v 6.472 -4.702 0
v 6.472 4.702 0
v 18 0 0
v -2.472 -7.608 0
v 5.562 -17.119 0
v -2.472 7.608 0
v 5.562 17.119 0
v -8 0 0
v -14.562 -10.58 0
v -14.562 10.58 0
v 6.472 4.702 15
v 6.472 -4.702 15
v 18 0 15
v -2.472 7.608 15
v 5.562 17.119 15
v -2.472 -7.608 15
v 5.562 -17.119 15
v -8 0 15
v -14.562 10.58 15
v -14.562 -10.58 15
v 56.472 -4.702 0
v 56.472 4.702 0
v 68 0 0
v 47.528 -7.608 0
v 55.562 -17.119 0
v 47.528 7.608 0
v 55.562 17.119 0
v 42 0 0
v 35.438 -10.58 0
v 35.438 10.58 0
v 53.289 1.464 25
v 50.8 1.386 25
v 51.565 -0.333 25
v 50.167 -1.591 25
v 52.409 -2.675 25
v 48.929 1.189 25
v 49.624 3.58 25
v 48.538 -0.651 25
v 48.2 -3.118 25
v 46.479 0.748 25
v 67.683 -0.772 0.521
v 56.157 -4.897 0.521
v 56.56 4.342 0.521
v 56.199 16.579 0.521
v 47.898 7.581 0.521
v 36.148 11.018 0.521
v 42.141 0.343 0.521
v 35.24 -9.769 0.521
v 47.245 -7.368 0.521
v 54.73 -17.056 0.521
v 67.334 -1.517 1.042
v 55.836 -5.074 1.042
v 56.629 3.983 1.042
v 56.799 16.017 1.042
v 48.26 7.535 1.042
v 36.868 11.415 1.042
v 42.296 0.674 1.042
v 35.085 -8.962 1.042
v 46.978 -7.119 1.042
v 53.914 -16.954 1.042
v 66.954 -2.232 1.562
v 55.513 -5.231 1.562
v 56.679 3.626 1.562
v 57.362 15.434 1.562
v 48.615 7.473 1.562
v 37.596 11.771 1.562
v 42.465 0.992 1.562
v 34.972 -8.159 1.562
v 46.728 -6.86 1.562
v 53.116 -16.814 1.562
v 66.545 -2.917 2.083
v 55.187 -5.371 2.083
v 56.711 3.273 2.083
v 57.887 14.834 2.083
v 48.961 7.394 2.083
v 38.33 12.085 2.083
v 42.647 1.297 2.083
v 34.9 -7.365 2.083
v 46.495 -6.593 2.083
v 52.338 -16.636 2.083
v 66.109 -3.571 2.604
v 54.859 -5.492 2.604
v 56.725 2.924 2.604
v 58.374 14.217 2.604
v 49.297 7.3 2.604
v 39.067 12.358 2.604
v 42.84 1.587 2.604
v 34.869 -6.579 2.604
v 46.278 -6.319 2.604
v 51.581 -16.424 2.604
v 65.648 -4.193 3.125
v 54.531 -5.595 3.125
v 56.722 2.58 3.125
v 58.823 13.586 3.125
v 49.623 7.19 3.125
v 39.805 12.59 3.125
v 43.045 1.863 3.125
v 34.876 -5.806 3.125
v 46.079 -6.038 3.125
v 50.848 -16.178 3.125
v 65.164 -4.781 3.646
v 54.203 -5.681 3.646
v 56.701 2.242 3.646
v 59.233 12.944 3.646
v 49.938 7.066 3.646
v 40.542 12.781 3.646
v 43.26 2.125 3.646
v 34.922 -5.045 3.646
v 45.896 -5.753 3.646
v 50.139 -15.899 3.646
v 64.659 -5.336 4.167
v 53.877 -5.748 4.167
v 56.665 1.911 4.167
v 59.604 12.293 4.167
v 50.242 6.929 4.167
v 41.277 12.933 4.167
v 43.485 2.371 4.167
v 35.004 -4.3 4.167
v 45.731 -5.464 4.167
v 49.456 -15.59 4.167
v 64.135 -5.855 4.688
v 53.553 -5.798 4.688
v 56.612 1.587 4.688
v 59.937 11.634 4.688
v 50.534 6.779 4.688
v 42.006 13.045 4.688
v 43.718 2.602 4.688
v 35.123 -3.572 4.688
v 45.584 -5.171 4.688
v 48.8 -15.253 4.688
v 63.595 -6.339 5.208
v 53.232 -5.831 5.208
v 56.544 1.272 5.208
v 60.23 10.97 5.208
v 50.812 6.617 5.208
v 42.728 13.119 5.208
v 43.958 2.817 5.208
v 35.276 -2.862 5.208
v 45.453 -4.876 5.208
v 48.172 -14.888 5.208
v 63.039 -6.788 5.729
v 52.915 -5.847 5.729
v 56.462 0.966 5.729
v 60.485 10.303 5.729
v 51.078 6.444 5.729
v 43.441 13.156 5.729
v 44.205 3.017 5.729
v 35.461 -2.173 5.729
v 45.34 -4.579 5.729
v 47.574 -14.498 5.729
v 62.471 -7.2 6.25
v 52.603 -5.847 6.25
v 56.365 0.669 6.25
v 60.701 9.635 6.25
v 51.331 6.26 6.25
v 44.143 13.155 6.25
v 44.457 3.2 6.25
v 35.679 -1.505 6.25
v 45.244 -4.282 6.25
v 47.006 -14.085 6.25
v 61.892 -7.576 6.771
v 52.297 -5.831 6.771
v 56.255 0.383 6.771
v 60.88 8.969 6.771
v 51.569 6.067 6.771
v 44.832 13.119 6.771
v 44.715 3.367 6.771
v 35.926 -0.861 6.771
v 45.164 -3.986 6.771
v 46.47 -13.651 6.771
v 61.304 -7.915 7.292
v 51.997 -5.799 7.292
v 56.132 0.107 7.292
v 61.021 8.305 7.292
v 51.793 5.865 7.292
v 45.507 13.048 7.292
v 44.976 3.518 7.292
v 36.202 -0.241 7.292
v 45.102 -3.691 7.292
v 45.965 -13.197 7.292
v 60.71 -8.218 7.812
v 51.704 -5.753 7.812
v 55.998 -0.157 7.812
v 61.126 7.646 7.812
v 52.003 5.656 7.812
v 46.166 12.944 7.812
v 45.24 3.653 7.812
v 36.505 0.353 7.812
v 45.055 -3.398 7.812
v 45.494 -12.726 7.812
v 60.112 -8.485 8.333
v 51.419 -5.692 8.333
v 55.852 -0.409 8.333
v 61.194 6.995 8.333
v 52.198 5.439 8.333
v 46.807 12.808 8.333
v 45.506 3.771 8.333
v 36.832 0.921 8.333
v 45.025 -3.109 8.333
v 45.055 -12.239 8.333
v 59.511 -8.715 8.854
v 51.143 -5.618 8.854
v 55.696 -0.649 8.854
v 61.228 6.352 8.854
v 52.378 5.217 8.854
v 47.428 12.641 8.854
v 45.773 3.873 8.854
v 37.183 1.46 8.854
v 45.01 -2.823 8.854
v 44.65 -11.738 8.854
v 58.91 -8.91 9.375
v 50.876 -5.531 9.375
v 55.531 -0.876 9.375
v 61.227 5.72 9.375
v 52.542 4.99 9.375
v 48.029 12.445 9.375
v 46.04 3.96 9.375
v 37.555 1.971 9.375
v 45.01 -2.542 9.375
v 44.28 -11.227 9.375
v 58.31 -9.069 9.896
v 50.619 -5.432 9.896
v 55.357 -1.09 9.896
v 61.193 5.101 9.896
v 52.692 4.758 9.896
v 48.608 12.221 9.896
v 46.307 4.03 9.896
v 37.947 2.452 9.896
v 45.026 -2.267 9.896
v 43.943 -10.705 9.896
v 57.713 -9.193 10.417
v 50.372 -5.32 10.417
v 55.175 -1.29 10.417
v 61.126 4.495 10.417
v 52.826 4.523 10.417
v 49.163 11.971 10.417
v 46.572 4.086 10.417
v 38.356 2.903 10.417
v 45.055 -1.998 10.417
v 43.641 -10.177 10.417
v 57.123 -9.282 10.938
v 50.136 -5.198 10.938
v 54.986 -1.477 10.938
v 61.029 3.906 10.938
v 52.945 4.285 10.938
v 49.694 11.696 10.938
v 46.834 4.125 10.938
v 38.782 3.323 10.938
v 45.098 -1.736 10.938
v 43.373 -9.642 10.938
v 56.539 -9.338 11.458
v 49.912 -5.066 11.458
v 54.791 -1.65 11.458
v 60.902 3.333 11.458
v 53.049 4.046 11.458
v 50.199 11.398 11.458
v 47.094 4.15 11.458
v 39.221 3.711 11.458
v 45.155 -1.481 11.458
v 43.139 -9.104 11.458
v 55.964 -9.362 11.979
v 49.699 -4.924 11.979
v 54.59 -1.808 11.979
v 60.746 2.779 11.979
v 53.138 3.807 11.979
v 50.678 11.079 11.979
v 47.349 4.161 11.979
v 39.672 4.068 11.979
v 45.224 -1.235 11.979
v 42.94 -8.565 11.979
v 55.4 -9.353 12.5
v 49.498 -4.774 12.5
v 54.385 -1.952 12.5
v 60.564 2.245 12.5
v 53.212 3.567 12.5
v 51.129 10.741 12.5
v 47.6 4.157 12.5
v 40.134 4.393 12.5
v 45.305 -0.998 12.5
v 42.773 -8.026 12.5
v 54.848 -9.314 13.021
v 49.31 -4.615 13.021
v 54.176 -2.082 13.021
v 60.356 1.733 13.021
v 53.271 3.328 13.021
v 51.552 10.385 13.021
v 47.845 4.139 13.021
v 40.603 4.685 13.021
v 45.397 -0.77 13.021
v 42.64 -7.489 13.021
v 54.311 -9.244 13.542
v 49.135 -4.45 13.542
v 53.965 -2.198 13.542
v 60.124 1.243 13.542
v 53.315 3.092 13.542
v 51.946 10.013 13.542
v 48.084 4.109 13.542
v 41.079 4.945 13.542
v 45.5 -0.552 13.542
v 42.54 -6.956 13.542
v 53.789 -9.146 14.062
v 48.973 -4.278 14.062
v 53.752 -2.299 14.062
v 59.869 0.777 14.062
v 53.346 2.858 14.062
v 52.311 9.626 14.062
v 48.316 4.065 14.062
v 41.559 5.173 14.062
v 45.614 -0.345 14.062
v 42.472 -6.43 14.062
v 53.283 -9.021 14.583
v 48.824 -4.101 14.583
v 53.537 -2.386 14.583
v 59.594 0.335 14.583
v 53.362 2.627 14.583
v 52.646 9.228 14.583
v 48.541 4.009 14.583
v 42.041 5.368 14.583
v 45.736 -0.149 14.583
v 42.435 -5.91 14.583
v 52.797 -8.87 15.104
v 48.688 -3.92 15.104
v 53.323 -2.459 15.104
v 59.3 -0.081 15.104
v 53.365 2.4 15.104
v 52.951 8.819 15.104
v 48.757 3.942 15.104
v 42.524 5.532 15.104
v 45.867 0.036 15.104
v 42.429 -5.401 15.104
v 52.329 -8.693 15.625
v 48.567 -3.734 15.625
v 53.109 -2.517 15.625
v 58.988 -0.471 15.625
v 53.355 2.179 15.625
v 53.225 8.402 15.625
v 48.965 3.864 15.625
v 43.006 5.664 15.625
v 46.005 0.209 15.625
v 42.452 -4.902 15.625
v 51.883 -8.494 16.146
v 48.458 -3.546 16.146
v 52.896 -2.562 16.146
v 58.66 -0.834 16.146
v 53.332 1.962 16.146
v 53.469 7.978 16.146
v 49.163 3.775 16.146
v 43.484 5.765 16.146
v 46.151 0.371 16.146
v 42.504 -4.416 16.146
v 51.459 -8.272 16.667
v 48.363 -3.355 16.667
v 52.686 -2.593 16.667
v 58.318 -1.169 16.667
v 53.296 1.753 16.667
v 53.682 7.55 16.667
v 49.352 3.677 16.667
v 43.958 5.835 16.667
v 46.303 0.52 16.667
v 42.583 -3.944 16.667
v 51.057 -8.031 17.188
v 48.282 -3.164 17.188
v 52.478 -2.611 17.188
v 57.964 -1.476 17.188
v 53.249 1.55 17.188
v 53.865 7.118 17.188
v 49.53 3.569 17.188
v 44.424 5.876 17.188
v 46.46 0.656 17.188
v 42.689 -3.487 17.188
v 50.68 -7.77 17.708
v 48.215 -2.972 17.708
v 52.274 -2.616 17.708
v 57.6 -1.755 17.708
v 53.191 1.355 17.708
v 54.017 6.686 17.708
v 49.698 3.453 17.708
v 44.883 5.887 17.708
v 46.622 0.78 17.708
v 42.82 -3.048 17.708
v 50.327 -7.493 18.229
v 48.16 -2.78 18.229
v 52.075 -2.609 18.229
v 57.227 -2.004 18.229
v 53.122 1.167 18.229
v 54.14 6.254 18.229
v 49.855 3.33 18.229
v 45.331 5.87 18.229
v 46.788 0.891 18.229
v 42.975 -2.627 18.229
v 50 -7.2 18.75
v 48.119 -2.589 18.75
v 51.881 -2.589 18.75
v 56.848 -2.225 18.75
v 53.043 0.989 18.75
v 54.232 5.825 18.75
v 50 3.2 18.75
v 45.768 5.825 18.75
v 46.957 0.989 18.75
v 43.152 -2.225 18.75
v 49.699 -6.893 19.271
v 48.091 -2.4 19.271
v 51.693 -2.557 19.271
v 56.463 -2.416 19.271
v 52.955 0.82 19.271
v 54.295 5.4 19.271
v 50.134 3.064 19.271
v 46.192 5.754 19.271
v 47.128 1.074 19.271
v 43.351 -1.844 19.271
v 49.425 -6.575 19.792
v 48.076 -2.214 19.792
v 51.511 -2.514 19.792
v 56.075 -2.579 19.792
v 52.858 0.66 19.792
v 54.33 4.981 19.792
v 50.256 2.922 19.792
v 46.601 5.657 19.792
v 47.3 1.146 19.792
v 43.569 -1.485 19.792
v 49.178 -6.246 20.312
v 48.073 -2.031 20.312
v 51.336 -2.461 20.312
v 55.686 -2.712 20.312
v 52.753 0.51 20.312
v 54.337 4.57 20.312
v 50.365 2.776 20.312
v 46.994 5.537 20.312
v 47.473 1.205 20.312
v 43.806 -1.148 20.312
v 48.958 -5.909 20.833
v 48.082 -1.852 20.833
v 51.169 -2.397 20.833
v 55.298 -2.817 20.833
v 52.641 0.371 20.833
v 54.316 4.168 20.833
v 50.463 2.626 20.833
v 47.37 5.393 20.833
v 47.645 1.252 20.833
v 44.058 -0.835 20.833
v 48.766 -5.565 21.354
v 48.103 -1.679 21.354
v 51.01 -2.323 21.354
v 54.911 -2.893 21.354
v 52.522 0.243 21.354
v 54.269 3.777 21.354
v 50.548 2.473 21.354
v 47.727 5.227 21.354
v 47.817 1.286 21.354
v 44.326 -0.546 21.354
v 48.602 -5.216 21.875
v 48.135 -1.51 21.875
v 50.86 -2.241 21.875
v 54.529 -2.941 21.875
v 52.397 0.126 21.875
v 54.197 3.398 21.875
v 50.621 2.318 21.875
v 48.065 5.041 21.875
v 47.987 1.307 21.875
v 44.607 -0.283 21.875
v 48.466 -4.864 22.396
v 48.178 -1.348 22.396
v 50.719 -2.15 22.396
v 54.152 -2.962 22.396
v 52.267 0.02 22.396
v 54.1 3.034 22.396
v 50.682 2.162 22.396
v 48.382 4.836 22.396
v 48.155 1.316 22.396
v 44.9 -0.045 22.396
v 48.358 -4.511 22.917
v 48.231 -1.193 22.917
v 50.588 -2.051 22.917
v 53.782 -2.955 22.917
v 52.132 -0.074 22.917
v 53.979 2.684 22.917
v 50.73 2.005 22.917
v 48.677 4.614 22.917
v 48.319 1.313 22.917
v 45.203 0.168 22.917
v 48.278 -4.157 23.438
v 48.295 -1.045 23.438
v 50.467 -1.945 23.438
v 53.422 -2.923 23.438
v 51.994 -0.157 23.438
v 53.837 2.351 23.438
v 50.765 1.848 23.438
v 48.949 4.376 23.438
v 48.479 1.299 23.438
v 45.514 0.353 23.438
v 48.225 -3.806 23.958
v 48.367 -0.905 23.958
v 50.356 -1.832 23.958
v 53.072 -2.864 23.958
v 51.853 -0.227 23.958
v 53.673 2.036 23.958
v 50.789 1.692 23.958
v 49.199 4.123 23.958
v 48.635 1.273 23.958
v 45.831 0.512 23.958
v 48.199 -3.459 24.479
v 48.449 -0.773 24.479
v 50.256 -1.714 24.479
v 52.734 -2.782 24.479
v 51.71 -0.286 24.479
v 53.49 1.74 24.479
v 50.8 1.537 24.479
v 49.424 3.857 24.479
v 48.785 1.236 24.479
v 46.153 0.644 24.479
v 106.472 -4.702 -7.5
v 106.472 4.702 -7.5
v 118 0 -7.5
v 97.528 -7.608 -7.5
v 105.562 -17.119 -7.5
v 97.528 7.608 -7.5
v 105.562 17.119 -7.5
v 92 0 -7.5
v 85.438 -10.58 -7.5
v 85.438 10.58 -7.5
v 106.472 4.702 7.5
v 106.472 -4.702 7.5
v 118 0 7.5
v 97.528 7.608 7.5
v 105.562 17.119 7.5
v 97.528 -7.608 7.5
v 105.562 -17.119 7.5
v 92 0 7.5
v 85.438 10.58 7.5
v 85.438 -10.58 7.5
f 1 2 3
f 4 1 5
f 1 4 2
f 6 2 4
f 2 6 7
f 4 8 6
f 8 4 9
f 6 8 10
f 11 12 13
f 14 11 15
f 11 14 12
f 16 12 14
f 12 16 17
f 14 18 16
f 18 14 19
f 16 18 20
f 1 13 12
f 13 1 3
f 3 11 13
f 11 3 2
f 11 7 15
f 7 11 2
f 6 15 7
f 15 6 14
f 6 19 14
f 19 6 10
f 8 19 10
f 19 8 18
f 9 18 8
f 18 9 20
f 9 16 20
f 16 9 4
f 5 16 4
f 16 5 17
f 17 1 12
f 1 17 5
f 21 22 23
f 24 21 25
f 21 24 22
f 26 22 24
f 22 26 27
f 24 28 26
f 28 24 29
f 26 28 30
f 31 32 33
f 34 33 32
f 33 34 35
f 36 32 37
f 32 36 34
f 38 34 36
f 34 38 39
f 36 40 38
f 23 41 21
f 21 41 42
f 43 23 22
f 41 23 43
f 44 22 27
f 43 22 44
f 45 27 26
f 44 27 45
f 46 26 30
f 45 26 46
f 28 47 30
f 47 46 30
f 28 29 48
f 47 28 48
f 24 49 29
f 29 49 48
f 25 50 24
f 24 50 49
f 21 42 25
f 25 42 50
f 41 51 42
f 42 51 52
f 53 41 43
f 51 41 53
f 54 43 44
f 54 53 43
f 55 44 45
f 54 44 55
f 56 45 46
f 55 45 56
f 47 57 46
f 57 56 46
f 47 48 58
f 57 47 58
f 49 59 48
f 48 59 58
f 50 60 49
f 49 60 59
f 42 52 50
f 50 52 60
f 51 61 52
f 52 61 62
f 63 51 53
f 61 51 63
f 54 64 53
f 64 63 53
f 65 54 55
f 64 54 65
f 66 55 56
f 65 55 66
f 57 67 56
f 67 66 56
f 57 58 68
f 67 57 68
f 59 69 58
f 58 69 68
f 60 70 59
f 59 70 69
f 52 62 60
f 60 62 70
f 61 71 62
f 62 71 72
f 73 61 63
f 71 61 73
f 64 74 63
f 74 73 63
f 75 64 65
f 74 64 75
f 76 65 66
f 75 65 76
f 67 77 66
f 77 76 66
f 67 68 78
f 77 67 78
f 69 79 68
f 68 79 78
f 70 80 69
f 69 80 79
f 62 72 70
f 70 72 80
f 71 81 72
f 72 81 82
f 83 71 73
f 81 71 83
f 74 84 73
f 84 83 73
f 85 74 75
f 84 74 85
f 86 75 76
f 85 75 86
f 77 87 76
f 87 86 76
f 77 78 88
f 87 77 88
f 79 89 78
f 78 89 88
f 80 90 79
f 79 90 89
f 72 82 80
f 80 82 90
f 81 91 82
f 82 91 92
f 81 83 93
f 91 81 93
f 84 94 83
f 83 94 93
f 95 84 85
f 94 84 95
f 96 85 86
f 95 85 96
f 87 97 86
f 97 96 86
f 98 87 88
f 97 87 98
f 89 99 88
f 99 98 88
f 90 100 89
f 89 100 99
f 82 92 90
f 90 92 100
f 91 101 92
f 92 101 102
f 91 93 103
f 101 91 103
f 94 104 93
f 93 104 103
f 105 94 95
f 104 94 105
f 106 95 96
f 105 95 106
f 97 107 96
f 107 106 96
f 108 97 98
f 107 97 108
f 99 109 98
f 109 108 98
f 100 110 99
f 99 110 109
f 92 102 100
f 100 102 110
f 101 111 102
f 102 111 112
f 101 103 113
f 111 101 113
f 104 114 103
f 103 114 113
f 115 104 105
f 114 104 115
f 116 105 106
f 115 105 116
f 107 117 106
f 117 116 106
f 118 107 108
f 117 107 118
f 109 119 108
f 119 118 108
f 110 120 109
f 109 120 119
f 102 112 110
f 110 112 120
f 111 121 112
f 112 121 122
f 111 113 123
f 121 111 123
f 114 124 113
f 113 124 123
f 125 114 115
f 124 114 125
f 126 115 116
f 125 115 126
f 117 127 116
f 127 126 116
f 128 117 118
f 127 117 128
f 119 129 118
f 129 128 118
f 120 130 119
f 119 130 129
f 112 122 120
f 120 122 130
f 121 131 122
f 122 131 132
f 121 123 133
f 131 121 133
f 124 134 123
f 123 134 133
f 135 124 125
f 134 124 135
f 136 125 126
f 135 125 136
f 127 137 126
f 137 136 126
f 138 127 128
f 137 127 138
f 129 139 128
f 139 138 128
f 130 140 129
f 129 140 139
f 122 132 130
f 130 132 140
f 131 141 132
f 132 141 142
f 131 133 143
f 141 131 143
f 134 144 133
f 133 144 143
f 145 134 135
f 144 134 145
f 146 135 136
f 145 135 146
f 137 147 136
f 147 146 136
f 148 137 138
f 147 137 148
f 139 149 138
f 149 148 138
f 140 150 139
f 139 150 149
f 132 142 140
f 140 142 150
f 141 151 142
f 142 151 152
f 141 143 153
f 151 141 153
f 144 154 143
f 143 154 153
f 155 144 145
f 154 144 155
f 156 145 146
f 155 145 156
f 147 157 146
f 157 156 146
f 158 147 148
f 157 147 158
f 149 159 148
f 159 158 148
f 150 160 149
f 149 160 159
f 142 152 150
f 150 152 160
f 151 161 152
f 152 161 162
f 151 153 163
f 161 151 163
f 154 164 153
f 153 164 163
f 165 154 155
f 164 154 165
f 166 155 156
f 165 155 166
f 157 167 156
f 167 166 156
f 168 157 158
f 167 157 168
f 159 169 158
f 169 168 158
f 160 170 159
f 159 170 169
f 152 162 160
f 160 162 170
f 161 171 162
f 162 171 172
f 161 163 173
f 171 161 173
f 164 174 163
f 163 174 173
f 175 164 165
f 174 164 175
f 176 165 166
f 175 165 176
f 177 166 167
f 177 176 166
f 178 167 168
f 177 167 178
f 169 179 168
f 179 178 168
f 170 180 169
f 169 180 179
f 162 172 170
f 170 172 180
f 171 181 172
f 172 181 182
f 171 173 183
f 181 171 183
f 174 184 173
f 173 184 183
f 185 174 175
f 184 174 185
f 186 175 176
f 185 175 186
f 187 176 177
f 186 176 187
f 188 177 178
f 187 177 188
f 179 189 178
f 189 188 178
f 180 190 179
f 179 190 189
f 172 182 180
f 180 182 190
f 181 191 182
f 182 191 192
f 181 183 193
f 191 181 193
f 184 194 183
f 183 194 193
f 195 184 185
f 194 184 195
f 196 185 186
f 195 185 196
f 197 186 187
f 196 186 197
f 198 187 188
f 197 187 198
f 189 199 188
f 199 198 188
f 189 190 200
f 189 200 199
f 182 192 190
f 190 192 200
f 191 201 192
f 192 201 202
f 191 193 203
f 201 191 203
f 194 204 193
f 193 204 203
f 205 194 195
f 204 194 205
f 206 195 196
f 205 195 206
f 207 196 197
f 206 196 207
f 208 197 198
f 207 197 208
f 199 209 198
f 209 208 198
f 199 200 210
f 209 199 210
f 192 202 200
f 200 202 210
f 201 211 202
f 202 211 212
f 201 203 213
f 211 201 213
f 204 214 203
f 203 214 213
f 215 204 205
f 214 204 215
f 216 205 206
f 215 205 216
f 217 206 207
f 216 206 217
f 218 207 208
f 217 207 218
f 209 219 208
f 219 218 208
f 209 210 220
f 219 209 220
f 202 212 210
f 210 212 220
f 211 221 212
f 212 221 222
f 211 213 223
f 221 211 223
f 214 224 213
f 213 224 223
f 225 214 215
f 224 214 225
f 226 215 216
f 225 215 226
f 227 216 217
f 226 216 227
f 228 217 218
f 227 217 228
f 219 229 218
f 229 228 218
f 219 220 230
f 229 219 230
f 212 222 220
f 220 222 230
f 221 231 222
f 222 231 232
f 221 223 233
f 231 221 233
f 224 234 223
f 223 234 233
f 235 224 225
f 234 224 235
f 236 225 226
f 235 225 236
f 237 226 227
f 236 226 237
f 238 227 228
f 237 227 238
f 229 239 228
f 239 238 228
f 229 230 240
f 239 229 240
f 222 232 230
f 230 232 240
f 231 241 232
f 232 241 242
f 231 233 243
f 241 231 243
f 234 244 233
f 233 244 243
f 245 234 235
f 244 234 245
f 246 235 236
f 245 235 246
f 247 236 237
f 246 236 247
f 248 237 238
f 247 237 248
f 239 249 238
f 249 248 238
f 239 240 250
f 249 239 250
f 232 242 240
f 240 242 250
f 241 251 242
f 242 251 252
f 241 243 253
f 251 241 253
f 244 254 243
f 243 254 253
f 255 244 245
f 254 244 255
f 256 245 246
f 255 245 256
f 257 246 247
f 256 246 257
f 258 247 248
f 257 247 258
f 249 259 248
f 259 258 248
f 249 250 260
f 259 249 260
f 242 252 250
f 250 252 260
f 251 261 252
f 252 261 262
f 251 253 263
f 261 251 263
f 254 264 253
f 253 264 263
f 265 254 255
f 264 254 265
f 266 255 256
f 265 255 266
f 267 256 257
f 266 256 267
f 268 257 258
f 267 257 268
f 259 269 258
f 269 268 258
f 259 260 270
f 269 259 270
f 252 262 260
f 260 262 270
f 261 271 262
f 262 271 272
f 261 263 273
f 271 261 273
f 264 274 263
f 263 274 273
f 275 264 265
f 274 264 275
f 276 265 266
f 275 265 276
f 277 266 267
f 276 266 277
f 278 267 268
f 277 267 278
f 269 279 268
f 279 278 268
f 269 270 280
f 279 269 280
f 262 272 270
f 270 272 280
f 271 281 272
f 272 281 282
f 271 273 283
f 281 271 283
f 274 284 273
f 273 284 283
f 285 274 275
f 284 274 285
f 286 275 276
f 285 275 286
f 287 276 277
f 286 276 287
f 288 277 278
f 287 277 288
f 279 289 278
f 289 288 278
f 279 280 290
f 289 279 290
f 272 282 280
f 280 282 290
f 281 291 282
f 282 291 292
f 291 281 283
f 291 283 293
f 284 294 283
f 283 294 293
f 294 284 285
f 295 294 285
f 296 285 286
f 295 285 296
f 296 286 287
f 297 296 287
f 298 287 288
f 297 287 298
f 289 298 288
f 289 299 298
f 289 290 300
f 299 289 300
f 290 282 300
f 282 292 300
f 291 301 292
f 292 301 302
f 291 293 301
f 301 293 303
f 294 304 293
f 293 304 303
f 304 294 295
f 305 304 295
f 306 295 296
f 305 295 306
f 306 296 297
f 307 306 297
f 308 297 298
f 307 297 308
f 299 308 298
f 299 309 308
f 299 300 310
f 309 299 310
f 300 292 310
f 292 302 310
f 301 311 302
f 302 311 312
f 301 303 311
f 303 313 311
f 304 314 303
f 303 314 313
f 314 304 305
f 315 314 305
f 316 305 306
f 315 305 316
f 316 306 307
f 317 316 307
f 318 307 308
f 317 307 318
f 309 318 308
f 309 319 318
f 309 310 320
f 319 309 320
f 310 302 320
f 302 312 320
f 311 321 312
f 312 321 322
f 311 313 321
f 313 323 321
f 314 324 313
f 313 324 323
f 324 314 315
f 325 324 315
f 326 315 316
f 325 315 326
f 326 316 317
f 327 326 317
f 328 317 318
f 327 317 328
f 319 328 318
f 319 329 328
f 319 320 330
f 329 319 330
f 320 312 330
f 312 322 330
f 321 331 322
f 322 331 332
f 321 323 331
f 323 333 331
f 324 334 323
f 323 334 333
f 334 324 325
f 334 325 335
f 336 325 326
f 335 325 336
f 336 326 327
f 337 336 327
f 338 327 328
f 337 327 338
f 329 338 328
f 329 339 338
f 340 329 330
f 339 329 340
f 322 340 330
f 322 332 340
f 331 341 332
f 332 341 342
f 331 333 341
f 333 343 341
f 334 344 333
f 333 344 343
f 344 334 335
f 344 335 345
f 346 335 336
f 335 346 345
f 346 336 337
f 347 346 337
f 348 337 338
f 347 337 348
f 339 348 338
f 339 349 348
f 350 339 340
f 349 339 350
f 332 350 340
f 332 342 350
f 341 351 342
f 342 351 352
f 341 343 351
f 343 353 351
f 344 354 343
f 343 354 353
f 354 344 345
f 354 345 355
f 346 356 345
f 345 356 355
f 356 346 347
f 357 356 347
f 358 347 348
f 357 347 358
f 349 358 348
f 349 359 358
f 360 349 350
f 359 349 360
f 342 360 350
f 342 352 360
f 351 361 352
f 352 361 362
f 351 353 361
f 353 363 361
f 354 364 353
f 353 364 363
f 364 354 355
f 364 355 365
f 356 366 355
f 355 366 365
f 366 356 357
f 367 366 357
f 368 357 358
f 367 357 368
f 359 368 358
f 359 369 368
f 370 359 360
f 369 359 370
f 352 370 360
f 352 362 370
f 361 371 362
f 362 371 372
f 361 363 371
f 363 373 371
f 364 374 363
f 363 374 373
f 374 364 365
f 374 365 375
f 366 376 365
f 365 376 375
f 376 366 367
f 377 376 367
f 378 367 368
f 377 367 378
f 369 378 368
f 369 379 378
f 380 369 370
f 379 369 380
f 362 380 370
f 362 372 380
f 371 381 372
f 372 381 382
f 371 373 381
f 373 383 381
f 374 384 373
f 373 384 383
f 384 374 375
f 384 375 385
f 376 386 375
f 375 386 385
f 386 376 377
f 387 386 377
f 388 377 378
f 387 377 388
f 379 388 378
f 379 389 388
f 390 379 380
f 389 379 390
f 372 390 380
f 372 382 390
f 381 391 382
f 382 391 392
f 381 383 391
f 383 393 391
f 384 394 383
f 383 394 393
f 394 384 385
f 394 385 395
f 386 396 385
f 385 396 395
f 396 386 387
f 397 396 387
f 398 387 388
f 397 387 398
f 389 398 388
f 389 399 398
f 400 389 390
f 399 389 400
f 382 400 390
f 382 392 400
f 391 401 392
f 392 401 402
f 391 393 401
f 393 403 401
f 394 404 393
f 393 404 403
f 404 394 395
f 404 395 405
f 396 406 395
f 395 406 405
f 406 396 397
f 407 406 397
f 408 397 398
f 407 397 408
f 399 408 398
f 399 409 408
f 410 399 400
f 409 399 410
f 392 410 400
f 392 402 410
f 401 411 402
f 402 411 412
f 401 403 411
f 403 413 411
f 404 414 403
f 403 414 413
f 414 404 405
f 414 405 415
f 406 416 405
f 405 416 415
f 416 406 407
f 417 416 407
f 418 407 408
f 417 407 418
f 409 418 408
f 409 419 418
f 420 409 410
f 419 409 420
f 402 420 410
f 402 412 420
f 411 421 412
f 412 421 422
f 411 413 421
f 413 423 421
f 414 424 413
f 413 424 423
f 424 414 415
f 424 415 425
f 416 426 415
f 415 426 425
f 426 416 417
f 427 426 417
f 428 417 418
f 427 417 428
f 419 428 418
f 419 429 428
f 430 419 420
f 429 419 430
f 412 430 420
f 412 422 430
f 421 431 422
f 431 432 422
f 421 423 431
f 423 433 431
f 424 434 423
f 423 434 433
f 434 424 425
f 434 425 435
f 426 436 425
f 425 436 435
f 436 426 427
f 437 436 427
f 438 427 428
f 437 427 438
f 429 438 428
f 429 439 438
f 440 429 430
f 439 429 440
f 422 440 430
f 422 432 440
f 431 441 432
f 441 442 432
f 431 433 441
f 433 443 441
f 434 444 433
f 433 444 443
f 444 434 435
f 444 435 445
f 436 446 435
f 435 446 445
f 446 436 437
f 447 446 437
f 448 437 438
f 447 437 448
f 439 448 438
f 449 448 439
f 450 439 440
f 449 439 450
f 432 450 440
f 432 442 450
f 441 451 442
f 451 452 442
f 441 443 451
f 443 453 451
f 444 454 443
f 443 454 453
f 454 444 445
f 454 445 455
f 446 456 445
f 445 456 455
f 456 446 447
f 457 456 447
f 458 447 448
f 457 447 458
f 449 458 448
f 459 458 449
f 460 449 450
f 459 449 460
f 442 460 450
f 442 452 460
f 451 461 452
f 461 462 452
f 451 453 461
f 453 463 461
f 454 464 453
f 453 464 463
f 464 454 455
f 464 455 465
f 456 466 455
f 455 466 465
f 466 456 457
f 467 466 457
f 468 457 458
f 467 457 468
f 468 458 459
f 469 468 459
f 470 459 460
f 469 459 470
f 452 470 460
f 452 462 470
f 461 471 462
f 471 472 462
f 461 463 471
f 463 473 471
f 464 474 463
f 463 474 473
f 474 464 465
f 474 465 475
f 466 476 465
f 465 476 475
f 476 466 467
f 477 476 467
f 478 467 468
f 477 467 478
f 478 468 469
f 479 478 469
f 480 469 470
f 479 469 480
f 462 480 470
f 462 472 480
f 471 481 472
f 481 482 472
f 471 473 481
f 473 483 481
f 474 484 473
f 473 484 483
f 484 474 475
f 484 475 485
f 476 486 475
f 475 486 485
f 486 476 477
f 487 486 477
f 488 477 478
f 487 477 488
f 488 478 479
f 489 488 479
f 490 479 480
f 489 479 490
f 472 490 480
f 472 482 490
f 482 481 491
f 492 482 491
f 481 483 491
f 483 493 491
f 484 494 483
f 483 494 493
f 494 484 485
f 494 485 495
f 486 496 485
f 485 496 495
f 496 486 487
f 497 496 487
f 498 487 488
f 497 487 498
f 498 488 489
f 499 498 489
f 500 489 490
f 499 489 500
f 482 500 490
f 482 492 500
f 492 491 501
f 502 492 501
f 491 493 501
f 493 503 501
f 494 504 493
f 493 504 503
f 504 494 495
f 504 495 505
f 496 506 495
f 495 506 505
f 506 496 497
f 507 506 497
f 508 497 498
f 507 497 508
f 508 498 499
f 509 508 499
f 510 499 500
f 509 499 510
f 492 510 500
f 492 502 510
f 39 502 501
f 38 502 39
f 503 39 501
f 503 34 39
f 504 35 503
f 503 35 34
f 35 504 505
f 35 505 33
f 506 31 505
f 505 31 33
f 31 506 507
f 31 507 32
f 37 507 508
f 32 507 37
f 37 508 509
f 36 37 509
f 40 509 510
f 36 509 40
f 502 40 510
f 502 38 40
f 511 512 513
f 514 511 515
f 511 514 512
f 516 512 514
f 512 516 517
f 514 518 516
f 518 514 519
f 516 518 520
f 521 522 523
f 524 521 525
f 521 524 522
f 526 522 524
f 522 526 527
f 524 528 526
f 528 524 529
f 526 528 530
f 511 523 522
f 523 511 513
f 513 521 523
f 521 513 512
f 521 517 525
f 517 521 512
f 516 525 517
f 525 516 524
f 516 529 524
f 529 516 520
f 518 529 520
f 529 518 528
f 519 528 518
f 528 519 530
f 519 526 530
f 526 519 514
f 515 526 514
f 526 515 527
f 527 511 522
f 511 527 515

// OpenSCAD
// linear_extrude(): push a 2D outline along Z.
//
// twist turns it as it rises, scale tapers it, and slices decides how
// many rings the sides are cut into -- too few and a twist looks faceted.

module star(points=5, r1=18, r2=8) {
    polygon([
        for (i = [0 : 2 * points - 1])
            let (a = i * 180 / points, r = (i % 2 == 0) ? r1 : r2)
            [r * cos(a), r * sin(a)]
    ]);
}

// Straight up.
linear_extrude(height=15) star();

// Twisted, and tapered to a point.
translate([50, 0, 0]) linear_extrude(height=25, twist=120, scale=0.2, slices=48) star();

// center=true straddles Z=0 instead of sitting on it.
translate([100, 0, 0]) linear_extrude(height=15, center=true) star();
